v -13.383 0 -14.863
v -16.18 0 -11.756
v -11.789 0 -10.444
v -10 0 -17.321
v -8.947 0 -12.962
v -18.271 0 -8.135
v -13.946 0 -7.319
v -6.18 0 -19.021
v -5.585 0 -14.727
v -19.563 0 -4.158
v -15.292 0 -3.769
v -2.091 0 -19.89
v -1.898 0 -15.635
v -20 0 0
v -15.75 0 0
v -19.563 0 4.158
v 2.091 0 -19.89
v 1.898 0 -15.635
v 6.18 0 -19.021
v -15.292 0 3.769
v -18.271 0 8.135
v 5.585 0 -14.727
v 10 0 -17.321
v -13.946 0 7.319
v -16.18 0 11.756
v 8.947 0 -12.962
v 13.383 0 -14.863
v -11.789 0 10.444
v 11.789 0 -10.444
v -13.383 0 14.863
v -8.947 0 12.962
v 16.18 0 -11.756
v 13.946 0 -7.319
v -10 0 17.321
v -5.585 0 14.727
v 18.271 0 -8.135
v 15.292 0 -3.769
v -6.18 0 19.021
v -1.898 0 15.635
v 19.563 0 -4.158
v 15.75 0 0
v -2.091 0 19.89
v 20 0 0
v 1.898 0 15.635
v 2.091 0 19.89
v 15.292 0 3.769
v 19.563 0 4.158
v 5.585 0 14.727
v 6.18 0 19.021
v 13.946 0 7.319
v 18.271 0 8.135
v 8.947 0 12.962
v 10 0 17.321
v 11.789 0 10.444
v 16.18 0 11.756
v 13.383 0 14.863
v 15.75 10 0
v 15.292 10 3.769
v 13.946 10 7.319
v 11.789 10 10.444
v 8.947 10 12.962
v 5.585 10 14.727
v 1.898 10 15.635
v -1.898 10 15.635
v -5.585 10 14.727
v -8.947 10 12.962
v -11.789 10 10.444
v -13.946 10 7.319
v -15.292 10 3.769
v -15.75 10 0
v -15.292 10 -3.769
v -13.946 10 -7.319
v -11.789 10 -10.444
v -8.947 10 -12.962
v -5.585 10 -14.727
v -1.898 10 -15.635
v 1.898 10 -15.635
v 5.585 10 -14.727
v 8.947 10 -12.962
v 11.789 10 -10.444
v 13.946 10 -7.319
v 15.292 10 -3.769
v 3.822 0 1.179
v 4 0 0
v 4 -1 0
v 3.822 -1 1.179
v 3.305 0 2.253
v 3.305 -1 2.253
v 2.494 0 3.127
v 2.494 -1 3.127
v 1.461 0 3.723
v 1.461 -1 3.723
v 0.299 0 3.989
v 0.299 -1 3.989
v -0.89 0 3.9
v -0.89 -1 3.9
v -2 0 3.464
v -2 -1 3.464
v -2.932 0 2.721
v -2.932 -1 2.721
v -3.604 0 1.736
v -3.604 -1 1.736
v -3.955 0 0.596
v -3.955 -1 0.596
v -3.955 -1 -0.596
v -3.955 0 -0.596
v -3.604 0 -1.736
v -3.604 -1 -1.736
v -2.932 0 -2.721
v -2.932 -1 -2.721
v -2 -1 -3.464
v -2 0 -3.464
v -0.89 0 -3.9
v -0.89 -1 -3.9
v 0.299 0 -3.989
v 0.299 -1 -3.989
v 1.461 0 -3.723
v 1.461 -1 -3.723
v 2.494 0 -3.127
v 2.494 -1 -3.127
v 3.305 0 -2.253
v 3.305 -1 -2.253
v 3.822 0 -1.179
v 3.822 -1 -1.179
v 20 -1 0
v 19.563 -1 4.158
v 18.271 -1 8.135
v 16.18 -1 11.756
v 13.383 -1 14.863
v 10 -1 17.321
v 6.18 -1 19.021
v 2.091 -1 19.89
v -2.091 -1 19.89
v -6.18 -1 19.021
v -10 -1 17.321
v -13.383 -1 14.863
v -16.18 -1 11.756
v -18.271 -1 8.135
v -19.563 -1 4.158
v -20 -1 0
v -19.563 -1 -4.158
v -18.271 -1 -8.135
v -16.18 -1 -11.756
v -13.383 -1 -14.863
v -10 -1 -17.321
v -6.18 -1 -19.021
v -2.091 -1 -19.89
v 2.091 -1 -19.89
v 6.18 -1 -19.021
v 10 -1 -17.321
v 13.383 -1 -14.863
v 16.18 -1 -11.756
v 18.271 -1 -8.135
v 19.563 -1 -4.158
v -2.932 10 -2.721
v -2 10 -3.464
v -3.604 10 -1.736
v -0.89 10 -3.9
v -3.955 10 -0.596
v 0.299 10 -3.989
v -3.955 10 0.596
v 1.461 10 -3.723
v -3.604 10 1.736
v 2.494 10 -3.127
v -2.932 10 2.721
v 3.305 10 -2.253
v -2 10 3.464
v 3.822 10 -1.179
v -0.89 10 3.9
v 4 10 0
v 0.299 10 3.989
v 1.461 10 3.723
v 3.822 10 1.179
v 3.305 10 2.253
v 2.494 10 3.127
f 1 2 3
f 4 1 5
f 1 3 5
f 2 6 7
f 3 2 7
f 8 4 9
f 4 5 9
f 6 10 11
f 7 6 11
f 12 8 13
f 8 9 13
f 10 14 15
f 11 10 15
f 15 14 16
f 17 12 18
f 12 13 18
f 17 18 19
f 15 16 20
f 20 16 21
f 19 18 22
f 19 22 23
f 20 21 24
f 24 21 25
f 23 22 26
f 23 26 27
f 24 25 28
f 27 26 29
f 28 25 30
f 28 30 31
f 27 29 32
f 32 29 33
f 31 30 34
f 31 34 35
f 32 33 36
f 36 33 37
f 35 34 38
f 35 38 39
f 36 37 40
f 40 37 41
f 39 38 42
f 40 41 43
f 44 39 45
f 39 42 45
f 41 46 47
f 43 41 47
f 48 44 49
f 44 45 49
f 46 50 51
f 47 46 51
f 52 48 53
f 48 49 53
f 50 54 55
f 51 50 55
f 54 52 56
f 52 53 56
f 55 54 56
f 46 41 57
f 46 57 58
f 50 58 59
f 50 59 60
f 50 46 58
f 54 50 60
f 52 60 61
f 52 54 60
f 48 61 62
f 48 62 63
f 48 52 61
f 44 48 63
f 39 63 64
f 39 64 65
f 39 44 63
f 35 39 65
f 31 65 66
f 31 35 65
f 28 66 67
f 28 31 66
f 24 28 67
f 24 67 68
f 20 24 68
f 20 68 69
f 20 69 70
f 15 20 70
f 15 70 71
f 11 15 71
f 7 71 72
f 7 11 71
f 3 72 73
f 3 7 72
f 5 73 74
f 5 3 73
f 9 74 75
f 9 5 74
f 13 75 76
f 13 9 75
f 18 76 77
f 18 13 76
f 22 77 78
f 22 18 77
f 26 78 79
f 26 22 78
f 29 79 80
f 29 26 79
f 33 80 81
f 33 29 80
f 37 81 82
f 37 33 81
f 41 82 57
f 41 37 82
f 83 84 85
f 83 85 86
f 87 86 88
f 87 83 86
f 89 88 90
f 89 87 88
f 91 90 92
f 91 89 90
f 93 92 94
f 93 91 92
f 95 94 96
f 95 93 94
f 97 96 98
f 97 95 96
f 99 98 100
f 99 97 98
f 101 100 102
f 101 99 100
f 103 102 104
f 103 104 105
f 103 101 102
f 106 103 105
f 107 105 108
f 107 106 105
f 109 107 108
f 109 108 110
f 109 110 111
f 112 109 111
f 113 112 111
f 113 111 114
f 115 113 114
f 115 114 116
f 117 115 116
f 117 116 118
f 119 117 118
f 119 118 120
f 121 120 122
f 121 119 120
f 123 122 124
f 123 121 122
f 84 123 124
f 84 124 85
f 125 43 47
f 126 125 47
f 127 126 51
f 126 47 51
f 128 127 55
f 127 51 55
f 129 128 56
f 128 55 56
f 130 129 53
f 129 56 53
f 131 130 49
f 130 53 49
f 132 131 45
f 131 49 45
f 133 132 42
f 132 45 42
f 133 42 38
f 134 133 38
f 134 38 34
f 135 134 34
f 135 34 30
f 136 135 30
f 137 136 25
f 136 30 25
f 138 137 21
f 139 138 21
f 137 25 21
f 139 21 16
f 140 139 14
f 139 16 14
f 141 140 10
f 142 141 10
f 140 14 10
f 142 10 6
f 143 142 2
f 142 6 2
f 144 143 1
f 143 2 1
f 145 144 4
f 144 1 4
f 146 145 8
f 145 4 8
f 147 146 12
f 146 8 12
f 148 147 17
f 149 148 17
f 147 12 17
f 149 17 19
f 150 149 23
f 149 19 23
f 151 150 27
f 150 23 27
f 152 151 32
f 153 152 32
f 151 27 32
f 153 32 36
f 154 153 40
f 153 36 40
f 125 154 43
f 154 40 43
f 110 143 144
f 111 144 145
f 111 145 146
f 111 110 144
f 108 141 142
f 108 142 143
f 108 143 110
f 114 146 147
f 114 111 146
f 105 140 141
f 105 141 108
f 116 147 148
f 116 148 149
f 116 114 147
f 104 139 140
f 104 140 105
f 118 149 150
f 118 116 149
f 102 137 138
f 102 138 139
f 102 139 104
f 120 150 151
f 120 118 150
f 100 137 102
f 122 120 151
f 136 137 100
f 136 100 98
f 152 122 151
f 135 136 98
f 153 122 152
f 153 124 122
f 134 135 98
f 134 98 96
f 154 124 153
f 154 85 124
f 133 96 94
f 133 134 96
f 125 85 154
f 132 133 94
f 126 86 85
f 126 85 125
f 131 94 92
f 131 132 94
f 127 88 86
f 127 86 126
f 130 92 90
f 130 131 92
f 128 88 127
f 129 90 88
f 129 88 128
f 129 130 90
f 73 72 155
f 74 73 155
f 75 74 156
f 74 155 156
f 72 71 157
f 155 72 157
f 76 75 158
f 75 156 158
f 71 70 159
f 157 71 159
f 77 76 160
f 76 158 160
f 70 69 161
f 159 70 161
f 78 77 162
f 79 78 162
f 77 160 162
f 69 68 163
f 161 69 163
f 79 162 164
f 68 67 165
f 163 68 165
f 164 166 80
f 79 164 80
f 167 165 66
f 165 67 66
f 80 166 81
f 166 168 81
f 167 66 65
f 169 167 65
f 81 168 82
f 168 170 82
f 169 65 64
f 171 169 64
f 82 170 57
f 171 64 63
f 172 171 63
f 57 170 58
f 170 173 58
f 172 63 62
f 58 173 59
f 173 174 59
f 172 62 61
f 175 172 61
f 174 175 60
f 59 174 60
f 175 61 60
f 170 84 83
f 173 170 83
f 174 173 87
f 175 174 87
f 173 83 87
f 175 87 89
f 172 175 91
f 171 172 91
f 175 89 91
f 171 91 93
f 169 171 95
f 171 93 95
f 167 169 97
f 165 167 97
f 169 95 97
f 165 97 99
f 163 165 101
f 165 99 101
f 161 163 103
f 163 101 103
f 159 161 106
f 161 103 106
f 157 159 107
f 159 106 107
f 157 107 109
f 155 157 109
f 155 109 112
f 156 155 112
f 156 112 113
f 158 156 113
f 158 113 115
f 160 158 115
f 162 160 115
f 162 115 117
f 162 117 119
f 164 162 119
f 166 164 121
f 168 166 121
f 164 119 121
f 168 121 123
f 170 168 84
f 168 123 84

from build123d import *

# Parameters (mm, degrees)
F0_R     = 20
F0_R_2   = 15.75
F0_R_3   = 4
F1_DEPTH = 1
F2_DEPTH = 10


# Not quite as in the source:
# - a feature names something its author has since deleted; it is built from what else it names


with BuildPart() as f1:
    # F0 (on Front) → F1 (new body)
    with BuildSketch(Plane.XZ):
        Circle(F0_R)
        Circle(F0_R_2, mode=Mode.SUBTRACT)
        Circle(F0_R_2)
        Circle(F0_R_3, mode=Mode.SUBTRACT)
    extrude(amount=F1_DEPTH)

    # F0 (on Front) → F2 (join)
    with BuildSketch(Plane.XZ):
        Circle(F0_R_2)
        Circle(F0_R_3, mode=Mode.SUBTRACT)
    extrude(amount=-F2_DEPTH)


solid = f1.part
